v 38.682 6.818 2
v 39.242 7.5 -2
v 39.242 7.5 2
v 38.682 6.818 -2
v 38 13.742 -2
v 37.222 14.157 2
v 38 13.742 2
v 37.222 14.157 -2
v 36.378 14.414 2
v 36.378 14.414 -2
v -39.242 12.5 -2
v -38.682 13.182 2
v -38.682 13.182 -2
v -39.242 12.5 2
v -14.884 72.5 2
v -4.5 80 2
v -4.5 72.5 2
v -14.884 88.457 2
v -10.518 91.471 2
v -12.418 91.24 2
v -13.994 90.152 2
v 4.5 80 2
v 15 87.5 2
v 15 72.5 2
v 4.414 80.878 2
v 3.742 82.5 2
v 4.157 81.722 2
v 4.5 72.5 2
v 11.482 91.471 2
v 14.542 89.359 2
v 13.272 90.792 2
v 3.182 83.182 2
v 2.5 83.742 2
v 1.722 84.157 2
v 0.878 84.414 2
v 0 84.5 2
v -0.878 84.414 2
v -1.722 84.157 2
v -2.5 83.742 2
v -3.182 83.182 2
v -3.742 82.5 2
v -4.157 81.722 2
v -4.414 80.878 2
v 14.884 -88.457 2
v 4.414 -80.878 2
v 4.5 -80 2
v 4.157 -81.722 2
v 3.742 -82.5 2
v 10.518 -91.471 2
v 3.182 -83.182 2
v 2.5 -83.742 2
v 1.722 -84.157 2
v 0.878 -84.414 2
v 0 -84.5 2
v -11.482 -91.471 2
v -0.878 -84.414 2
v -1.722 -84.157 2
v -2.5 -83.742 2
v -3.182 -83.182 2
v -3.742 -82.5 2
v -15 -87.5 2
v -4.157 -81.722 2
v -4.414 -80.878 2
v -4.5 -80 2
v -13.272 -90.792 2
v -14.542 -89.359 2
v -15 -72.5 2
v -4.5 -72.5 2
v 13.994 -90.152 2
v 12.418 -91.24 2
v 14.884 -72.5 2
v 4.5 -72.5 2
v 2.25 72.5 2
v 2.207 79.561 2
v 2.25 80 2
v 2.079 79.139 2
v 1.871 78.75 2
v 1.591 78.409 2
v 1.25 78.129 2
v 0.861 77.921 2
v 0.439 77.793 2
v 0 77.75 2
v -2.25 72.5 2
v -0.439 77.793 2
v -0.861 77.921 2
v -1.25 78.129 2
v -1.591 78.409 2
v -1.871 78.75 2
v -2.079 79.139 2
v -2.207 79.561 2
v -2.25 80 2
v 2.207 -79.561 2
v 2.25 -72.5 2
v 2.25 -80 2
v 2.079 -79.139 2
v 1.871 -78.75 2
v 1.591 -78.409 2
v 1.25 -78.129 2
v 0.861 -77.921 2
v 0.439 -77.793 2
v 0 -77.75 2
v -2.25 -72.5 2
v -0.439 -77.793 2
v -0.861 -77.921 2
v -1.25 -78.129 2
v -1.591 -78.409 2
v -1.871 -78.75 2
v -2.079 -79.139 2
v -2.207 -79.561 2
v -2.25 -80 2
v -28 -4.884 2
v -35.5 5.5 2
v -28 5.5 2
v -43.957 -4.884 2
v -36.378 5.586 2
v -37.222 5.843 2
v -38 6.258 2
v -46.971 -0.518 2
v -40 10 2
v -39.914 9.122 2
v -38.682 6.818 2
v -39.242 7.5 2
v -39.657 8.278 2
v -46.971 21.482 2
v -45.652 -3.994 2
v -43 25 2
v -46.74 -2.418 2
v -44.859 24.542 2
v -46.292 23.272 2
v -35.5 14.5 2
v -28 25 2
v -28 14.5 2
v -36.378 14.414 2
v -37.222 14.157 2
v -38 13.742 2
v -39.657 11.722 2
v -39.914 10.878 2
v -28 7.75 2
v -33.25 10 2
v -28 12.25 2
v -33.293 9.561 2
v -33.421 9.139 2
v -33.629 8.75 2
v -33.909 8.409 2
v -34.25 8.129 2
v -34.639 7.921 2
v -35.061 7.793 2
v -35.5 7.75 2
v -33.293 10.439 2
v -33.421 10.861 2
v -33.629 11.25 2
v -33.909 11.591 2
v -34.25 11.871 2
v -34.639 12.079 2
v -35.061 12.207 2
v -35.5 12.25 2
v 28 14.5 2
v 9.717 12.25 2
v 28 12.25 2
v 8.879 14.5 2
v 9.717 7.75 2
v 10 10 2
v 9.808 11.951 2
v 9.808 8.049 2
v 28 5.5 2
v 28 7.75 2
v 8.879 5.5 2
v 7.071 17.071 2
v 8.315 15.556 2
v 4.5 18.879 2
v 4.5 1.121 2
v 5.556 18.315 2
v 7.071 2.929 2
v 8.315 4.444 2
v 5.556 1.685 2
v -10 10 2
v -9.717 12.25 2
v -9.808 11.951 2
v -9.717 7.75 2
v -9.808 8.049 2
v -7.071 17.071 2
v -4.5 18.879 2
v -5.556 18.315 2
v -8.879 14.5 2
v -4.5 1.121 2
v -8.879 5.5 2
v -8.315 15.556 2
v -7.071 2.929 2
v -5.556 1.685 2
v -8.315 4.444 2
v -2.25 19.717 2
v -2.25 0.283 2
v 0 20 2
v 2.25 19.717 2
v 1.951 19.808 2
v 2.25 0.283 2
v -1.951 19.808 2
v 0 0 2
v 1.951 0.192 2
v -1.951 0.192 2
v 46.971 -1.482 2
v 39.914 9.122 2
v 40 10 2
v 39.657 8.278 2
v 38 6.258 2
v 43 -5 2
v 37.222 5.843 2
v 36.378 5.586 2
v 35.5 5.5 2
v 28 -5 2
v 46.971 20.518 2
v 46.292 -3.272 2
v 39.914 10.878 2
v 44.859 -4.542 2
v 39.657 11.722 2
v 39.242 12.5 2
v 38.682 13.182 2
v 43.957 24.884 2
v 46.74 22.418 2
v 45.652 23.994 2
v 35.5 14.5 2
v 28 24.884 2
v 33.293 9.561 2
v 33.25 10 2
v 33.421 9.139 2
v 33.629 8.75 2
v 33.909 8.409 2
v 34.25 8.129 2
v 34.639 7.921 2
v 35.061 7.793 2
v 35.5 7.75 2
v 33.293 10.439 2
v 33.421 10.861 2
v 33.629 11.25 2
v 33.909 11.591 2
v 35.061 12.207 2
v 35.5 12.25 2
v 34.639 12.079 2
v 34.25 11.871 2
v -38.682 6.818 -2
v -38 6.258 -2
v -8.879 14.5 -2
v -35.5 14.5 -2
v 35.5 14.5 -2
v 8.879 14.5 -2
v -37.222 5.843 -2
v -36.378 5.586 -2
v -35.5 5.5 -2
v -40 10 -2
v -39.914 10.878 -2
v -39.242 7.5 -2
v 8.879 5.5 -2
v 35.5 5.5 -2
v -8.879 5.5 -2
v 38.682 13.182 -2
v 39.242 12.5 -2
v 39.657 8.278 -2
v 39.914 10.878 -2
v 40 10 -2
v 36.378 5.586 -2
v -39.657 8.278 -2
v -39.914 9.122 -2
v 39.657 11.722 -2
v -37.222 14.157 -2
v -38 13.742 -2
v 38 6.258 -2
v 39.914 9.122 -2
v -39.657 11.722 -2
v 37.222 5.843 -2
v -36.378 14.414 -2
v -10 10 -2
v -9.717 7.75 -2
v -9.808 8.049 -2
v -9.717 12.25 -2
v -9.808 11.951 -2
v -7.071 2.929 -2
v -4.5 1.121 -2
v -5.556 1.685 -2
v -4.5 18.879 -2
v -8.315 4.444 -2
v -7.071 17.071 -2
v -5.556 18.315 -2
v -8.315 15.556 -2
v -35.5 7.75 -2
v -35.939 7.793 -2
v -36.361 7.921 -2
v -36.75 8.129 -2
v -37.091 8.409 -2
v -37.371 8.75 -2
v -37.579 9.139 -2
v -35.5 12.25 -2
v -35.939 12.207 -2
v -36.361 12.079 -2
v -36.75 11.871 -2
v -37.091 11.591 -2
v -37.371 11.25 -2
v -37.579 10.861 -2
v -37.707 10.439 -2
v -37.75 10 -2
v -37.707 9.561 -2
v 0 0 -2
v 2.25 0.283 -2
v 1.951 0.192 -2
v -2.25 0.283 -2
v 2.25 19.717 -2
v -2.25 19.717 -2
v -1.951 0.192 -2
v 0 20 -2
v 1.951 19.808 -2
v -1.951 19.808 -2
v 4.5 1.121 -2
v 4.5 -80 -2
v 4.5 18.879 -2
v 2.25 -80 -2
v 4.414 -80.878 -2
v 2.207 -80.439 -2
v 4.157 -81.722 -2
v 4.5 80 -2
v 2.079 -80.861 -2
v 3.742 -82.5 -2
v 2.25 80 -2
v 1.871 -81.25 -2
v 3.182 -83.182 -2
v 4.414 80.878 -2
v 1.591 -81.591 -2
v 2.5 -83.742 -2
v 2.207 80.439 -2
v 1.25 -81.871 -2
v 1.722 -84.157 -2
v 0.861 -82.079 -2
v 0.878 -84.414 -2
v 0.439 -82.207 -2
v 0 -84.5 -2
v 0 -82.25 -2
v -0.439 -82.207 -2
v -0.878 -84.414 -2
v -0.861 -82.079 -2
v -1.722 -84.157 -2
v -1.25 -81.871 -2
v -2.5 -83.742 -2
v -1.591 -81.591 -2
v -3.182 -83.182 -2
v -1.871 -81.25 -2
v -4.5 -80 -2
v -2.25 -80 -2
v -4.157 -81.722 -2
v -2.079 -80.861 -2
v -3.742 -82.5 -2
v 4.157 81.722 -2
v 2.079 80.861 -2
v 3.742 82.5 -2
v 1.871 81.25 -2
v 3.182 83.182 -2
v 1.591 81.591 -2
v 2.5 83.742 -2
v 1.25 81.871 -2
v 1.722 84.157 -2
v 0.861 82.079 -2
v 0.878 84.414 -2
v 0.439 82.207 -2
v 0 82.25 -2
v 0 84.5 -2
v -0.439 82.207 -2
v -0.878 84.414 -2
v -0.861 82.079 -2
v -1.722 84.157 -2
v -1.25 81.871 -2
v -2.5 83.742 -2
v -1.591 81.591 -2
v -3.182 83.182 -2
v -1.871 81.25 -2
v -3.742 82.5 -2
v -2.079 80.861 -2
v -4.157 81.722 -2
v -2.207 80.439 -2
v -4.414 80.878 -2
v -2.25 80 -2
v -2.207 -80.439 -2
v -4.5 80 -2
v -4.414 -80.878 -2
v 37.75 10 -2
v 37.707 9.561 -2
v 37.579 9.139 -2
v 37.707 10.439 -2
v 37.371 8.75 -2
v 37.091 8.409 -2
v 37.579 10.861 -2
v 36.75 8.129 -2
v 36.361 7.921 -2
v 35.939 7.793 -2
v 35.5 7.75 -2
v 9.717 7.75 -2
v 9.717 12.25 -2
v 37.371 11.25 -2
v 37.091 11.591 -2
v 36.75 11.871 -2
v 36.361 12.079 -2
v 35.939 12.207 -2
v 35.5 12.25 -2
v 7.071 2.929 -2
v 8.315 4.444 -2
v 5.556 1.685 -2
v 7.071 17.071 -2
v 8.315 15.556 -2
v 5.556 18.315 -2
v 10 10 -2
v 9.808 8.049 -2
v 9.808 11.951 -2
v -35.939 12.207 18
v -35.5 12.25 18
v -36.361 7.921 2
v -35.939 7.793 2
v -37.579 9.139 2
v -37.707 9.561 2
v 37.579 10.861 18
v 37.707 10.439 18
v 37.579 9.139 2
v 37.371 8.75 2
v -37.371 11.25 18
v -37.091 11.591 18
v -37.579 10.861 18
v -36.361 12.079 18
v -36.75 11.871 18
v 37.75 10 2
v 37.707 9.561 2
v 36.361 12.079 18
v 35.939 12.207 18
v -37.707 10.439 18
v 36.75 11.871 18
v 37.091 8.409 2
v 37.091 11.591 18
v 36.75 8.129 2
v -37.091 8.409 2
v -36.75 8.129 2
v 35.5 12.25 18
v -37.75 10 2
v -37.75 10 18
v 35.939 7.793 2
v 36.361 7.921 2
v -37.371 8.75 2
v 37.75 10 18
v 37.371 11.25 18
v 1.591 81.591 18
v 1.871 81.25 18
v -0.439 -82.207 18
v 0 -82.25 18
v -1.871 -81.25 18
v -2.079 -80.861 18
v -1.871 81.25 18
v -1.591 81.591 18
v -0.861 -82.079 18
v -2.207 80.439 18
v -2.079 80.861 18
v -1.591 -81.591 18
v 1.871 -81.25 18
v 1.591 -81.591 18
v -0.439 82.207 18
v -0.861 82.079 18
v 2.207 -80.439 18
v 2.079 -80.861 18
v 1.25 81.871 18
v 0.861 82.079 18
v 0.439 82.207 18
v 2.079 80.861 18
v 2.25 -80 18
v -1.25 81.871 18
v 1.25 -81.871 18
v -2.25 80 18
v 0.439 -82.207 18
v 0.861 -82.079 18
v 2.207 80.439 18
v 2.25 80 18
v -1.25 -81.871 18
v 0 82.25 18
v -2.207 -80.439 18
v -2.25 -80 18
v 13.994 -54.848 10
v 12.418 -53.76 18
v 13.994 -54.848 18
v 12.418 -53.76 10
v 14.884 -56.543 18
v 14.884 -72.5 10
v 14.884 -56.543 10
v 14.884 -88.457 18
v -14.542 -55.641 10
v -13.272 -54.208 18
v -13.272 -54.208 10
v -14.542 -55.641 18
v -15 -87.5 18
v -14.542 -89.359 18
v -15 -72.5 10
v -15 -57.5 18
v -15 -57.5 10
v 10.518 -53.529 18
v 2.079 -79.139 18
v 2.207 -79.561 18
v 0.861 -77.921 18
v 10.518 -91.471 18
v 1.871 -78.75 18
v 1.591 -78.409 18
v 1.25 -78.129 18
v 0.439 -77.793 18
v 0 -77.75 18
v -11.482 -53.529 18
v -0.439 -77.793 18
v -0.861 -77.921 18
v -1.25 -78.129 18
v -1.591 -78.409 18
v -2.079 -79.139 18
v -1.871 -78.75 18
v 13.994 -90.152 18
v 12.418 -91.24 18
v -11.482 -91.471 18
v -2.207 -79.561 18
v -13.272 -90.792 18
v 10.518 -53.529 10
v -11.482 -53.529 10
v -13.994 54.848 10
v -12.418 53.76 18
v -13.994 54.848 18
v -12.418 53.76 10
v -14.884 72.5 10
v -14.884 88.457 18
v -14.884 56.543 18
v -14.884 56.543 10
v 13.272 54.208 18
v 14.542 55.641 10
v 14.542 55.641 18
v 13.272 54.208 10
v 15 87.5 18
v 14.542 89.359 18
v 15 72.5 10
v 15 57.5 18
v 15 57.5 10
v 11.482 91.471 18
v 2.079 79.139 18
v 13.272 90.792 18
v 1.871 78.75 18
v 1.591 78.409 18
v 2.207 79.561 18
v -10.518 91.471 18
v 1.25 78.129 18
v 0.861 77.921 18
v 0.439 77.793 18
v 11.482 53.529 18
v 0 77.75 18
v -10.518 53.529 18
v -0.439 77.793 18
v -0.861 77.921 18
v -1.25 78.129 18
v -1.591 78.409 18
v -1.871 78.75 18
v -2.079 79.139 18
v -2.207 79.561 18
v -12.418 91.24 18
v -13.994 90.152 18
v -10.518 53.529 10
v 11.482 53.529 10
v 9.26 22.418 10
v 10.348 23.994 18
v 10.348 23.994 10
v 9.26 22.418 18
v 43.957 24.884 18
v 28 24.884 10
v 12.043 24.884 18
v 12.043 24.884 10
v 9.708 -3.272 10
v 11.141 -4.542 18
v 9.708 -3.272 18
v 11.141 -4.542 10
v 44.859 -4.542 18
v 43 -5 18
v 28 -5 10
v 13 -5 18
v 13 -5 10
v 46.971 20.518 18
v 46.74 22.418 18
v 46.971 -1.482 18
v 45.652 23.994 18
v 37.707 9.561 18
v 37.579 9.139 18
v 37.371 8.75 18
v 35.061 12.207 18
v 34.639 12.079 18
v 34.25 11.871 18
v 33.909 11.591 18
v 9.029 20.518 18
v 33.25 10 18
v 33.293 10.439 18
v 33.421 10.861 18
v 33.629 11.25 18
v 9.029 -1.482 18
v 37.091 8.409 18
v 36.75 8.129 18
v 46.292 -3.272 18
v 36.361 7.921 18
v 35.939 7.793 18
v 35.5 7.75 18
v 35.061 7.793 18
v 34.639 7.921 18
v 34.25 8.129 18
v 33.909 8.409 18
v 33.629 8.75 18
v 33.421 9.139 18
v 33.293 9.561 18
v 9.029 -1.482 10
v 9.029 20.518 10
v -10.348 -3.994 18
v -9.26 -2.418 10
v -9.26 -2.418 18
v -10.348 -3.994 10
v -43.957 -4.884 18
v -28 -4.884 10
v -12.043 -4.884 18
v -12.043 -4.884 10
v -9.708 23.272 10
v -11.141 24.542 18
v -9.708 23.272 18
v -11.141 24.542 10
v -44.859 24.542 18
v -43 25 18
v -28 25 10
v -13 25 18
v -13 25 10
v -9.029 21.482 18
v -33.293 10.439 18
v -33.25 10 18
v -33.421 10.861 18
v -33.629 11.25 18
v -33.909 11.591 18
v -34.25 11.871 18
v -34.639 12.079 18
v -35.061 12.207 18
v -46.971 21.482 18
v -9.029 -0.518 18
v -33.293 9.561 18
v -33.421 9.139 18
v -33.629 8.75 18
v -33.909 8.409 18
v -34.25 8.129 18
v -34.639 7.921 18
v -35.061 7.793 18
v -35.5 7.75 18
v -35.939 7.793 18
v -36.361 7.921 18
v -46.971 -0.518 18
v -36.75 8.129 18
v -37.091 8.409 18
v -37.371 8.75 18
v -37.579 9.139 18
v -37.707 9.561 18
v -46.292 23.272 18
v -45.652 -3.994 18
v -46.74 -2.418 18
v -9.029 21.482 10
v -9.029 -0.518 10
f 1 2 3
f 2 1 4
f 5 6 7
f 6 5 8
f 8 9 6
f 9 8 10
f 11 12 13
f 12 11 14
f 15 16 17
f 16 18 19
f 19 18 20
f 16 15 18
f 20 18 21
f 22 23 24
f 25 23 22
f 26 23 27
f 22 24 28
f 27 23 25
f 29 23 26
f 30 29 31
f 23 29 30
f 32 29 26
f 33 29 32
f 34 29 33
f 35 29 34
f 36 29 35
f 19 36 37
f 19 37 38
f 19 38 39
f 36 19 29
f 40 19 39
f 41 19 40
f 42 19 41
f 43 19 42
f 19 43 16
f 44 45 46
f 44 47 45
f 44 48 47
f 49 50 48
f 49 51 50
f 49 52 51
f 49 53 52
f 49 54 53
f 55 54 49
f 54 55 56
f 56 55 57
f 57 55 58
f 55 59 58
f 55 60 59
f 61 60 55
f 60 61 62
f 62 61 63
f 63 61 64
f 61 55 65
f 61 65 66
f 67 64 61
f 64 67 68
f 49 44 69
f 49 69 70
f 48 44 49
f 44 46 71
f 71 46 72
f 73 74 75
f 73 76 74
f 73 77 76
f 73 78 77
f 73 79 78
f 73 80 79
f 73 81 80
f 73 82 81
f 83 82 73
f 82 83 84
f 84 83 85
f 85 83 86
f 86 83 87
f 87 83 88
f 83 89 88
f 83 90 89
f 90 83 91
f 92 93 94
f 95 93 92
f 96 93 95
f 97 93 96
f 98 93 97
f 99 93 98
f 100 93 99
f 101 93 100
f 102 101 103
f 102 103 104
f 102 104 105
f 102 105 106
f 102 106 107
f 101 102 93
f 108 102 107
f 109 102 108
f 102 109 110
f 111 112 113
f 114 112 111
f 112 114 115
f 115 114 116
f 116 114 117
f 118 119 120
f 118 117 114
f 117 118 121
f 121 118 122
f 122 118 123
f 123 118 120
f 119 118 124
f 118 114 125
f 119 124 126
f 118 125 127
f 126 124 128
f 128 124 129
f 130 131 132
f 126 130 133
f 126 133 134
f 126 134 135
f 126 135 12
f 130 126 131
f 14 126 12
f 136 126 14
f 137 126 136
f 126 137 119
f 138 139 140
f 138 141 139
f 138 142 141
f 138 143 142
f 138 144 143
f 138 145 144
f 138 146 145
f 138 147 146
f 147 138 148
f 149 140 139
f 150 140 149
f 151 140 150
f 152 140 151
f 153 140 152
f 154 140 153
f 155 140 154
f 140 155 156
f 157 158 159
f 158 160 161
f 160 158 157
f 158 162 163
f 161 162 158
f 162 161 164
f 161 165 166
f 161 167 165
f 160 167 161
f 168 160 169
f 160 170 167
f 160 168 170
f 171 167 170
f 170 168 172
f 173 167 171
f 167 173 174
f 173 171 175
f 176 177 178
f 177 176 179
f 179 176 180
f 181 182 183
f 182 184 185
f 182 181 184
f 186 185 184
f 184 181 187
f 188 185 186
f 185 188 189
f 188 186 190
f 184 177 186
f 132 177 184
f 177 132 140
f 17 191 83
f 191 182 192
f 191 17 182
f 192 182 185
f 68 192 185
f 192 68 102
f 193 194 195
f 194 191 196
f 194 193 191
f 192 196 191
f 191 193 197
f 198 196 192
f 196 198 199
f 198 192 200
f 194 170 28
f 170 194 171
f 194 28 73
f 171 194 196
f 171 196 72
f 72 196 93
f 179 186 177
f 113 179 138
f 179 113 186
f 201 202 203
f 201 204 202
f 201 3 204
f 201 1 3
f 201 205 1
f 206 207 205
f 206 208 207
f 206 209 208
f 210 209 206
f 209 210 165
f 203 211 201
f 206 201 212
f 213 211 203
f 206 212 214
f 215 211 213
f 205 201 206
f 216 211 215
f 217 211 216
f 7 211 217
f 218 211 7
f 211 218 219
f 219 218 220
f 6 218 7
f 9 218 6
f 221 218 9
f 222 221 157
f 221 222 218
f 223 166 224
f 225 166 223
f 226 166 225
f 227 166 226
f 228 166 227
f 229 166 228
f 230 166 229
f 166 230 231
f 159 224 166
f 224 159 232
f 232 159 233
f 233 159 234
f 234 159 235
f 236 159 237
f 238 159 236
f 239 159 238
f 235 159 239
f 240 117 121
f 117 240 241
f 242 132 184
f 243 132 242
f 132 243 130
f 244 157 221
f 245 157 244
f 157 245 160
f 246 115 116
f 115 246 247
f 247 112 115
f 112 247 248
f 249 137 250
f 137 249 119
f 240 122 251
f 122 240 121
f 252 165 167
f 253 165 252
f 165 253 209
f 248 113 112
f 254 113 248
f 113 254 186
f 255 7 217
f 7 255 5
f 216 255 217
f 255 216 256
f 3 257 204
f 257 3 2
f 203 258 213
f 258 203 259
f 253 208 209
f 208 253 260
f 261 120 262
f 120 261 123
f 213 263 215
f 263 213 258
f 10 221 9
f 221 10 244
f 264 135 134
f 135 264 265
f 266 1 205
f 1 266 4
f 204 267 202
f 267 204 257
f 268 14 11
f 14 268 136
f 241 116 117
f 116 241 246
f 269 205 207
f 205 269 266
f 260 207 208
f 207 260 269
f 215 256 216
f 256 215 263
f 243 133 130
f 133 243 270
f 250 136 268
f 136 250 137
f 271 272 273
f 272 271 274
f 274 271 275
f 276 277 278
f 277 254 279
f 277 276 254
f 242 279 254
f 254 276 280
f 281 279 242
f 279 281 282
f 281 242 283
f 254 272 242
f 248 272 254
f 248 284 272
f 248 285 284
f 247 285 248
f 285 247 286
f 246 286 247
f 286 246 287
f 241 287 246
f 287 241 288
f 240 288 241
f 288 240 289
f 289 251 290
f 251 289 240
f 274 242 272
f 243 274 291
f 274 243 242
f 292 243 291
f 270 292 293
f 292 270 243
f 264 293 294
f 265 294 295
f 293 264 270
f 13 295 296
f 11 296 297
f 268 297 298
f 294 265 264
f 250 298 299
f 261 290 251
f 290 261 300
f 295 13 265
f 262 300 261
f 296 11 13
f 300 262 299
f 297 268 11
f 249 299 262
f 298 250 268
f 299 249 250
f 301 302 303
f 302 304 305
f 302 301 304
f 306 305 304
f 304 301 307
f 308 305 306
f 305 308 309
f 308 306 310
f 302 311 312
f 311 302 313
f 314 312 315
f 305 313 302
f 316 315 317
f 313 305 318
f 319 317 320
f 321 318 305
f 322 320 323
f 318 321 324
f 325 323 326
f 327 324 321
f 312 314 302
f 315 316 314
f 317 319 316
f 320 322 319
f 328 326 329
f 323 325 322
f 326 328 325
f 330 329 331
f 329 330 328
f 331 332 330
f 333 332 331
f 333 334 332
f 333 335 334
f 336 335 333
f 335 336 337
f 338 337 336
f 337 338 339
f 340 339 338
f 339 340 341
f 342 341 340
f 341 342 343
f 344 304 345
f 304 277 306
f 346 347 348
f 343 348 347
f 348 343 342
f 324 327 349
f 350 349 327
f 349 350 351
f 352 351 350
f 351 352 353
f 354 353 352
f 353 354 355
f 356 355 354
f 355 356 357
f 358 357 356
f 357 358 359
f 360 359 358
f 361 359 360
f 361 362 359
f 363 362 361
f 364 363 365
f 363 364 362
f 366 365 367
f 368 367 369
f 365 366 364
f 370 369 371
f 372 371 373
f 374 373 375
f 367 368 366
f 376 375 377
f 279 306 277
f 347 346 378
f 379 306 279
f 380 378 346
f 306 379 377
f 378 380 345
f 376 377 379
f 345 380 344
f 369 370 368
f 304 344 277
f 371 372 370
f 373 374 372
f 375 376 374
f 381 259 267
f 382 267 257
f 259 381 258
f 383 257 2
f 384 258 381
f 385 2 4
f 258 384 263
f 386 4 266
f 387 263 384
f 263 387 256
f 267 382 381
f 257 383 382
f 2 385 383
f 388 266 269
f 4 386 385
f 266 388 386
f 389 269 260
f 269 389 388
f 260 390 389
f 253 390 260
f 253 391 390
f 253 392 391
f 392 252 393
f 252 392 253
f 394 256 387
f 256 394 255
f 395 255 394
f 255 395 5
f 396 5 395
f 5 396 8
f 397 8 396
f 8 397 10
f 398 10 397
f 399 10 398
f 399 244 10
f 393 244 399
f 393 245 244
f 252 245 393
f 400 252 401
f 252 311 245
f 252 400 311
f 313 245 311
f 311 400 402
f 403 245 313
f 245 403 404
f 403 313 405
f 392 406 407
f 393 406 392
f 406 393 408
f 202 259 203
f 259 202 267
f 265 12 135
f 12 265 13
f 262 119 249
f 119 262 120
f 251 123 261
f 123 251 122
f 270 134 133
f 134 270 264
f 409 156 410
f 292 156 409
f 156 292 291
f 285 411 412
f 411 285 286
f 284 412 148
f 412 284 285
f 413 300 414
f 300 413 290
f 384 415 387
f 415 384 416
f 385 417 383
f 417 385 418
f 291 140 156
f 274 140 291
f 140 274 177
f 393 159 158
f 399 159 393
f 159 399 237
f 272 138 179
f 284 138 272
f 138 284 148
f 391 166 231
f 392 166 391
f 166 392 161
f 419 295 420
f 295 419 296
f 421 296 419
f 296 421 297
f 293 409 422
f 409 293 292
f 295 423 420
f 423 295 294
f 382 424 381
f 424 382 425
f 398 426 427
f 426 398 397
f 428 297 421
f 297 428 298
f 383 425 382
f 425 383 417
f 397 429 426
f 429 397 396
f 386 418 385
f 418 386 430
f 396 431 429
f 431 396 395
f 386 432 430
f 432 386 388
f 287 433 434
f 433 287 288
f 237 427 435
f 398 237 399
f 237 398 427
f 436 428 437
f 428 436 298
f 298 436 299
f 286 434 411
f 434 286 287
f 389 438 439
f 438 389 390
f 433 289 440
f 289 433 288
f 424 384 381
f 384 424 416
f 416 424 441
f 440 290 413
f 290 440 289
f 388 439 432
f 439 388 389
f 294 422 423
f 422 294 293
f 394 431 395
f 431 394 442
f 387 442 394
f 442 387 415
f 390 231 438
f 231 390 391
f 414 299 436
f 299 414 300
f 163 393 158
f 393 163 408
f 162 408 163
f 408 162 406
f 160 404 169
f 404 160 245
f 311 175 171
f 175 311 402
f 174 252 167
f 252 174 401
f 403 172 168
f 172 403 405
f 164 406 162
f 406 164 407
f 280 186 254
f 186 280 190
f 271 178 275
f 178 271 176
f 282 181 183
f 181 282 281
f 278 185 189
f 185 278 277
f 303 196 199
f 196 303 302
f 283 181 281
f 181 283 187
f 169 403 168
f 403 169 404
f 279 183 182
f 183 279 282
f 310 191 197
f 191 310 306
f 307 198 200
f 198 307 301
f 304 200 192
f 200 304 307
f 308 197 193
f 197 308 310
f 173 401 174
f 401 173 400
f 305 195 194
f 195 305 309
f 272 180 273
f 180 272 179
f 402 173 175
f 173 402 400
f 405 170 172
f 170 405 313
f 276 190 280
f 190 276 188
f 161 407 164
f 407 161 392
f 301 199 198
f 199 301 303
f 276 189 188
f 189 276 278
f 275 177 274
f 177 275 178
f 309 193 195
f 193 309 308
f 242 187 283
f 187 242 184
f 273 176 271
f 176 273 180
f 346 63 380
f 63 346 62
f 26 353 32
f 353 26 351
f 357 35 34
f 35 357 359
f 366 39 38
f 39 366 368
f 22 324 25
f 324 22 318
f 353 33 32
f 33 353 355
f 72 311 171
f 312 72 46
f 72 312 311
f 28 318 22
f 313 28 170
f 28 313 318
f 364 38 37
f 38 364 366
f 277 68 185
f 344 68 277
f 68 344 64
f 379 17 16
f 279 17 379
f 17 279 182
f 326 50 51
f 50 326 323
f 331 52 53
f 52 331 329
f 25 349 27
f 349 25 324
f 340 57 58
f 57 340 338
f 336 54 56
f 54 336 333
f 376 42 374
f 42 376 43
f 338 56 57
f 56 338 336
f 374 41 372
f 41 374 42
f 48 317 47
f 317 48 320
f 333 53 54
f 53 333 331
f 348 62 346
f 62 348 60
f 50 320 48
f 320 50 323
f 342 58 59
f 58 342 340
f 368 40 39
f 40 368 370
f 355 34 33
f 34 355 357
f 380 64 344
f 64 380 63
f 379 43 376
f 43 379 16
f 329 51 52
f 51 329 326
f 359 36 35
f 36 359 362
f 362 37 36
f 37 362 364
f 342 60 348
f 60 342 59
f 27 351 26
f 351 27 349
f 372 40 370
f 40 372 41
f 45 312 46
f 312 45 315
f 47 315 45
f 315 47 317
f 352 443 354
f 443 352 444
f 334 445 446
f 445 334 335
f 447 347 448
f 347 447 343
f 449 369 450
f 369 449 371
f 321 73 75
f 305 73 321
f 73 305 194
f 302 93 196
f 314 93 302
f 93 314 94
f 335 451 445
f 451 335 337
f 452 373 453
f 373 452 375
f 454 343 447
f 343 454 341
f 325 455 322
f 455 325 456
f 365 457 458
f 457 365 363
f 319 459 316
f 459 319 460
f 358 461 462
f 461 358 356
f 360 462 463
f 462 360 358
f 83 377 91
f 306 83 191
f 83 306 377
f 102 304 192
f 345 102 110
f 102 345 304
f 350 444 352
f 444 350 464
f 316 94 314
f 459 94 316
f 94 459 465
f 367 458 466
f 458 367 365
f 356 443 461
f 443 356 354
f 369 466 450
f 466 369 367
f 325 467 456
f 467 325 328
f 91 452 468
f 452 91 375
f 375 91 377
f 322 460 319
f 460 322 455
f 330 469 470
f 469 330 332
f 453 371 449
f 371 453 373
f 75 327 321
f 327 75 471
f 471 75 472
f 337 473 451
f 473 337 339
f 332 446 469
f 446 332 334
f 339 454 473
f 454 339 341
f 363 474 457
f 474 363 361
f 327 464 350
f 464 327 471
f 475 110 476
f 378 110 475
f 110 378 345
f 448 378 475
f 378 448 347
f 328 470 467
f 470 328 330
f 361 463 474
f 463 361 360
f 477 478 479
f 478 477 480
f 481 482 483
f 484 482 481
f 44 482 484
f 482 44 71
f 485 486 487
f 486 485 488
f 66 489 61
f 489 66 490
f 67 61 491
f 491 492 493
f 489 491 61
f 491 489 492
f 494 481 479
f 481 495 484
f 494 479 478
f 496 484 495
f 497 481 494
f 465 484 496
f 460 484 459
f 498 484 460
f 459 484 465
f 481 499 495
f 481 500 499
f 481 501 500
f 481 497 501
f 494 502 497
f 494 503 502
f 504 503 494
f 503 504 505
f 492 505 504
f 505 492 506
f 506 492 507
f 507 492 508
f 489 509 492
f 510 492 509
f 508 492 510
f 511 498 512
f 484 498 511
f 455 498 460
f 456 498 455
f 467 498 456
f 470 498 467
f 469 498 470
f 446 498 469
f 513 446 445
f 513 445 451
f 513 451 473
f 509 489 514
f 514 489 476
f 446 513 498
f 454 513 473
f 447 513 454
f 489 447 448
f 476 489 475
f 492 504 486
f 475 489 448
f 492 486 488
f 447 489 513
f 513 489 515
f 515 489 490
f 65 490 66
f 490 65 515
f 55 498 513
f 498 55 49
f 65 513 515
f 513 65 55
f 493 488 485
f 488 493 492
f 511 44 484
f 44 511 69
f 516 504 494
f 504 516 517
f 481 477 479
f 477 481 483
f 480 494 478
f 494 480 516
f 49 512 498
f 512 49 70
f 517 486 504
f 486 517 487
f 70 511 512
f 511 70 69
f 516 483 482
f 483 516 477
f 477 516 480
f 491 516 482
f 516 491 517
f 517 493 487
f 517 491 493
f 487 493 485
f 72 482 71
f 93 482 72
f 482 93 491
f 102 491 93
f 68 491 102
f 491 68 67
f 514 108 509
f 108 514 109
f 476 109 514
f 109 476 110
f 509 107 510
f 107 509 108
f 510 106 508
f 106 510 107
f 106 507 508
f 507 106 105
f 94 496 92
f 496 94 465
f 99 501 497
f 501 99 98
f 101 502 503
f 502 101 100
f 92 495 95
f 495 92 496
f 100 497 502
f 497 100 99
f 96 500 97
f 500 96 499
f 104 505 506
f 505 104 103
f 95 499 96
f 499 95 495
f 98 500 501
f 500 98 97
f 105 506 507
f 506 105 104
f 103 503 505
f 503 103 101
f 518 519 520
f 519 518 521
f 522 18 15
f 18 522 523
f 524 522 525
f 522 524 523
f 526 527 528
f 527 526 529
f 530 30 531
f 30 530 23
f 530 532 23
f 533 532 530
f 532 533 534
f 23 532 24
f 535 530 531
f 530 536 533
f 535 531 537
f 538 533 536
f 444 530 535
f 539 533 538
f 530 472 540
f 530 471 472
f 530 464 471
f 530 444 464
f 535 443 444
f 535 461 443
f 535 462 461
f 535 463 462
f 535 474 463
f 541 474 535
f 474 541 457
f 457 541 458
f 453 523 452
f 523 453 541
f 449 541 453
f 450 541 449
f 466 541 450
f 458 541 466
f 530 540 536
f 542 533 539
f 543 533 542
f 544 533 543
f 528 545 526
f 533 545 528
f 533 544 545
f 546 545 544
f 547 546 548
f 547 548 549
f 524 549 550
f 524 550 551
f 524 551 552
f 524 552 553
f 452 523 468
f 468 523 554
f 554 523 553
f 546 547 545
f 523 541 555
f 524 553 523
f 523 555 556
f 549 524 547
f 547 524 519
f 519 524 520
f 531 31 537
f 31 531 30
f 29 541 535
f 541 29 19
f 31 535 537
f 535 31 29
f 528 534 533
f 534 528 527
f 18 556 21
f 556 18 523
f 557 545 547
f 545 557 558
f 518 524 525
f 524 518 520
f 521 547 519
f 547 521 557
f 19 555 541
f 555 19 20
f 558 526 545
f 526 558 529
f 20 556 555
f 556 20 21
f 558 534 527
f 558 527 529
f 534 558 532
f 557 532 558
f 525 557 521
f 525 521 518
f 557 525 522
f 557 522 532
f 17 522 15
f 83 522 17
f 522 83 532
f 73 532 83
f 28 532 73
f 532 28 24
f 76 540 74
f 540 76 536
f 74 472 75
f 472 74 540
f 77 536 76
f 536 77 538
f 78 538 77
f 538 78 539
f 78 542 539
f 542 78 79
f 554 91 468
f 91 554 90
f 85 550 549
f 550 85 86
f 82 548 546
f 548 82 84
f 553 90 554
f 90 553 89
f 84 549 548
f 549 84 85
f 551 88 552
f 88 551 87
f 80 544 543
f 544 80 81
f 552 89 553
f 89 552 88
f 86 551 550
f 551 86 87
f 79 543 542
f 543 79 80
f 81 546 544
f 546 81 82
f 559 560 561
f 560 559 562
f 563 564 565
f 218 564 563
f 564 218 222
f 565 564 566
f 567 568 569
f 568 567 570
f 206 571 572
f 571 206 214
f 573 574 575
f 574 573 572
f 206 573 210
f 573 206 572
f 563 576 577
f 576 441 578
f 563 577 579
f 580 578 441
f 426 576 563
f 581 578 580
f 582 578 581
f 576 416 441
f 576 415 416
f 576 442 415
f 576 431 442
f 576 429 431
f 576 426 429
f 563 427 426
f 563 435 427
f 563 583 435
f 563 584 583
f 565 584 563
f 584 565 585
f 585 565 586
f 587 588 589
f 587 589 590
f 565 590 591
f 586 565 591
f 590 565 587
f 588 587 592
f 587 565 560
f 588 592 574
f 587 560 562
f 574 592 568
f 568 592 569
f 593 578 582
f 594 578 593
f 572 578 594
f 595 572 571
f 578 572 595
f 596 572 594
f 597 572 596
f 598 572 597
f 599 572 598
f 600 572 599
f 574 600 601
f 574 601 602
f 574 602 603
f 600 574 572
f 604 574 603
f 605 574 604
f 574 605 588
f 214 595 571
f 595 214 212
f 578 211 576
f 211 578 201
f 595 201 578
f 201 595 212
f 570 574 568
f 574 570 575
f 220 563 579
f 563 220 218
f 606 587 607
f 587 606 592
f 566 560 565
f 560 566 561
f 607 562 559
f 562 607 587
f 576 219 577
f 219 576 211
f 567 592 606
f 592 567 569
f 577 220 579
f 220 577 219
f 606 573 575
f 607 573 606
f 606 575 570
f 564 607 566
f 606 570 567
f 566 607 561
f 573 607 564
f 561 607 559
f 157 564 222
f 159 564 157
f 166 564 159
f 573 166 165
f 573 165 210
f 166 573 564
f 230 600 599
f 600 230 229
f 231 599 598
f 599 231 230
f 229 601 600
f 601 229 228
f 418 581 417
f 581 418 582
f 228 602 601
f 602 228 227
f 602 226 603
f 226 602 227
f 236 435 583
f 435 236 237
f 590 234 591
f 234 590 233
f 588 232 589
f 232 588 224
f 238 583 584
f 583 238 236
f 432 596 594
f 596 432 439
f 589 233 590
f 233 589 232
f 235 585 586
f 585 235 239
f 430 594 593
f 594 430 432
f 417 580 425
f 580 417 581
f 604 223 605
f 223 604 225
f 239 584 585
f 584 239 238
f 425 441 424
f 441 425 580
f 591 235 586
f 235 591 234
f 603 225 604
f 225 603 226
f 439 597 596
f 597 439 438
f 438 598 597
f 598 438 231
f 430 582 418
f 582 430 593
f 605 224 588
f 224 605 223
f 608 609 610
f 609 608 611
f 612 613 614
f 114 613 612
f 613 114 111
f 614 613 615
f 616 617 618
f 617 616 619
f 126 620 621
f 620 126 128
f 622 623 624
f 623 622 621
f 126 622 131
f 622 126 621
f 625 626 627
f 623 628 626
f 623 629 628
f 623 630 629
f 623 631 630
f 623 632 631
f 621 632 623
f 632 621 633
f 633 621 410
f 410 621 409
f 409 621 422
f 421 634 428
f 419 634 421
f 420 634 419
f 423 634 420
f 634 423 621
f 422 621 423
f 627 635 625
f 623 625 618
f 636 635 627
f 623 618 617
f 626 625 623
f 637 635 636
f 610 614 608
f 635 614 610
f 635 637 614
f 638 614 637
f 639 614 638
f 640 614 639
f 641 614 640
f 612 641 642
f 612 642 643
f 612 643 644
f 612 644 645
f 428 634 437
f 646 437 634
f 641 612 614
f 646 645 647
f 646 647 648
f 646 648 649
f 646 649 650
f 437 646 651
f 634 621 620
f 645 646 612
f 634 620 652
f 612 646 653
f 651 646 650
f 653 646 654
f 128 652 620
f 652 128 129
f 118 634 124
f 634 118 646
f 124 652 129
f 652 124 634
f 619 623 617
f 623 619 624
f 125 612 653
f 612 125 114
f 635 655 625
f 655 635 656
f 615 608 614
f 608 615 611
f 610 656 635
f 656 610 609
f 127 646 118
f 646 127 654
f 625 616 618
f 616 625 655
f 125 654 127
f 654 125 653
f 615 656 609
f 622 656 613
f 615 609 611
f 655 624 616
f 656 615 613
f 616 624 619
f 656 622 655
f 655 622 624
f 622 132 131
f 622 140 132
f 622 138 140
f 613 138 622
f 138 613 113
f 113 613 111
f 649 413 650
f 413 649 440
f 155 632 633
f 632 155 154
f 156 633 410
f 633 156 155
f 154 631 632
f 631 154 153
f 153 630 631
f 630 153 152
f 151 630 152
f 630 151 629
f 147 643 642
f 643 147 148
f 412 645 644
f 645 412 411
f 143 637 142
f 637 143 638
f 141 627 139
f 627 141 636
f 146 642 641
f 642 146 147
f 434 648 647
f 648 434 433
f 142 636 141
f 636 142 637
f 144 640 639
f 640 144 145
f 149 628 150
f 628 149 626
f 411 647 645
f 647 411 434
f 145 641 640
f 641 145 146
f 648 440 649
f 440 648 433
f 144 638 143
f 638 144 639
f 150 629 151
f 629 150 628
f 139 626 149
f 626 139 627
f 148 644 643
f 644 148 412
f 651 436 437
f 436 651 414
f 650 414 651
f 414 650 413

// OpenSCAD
len_phone = 145;
d_screw_m4 = 4.5;
width_phone = 56;
thikness_holder = 4;
thikness_phone = 8;
append = 15;
corner_round = 8;
w_grip = 30;

holder_set();
//vertical_block(len_phone);

module grip() {
    difference() {
        grip_base();
        
        color("red")
        translate([0, w_grip/2, thikness_phone])
        cube([w_grip+1, w_grip, 2*thikness_phone], center=true);
        
        translate([0, -w_grip/4, 0])
        cylinder(d=d_screw_m4, 3*thikness_phone, center=true, $fn=32);
    }
}


module grip_base() {
    hull() {
        translate([w_grip/2-corner_round/2, -w_grip/2, 0])
        cylinder(d=corner_round, 2*thikness_phone, center=true);
        
        translate([-w_grip/2+corner_round/2, -w_grip/2, 0])
        cylinder(d=corner_round, 2*thikness_phone, center=true);
        
        translate([w_grip/2-corner_round/2, w_grip/2, 0])
        cylinder(d=corner_round, 2*thikness_phone, center=true);
        
        translate([-w_grip/2+corner_round/2, w_grip/2, 0])
        cylinder(d=corner_round, 2*thikness_phone, center=true);
    }
}


module horizontal_block(len_block, offset_vertical) {
    len_block = len_block + append;
    
    translate([0, offset_vertical, 0])
    cylinder(d=20, h=thikness_holder, center=true, $fn=32);
    
    difference() {
        hull() {
            translate([len_block/2, offset_vertical, 0])
            cylinder(d=9, h=thikness_holder, center=true, $fn=32);
            
            translate([-len_block/2, offset_vertical, 0])
            cylinder(d=9, h=thikness_holder, center=true, $fn=32);
        }
        color("red")
        hull() {
            translate([len_block/2, offset_vertical, 0])
            cylinder(d=d_screw_m4, h=thikness_holder+2, center=true, $fn=32);
            
            translate([-len_block/2, offset_vertical, 0])
            cylinder(d=d_screw_m4, h=thikness_holder+2, center=true, $fn=32);
        }
    }
}


module vertical_block(len_block) {
    len_block = len_block + append;
    
        difference() {
            hull() {
                //translate([0, -len_phone/2, 0])
                translate([0, -len_block/2, 0])
                cylinder(d=9, h=thikness_holder, center=true, $fn=32);
                
                //translate([0, -len_phone/2, 0])
                translate([0, len_block/2, 0])
                cylinder(d=9, h=thikness_holder, center=true, $fn=32);
            }
            color("red")
            hull() {
                //translate([0, -len_phone/2, 0])
                translate([0, -len_block/2, 0])
                cylinder(d=d_screw_m4, h=thikness_holder+2, center=true, $fn=32);
                
                //translate([0, -len_phone/2, 0])
                translate([0, len_block/2, 0])
                cylinder(d=d_screw_m4, h=thikness_holder+2, center=true, $fn=32);
        }
    }
}

module holder_set() {
    horizontal_block(len_block=width_phone, offset_vertical=10);
    vertical_block(len_block=len_phone);
    
    translate([0, -len_phone/2, thikness_phone+thikness_holder/2])
    rotate([0, 180, 0])
    grip();
    
    translate([0, len_phone/2, thikness_phone+thikness_holder/2])
    rotate([0, 180, 180])
    grip();
    
    translate([width_phone/2, 10, thikness_phone+thikness_holder/2])
    rotate([0, 180, 90])
    grip();
    
    translate([-width_phone/2, 10, thikness_phone+thikness_holder/2])
    rotate([0, 180, -90])
    grip();
}
